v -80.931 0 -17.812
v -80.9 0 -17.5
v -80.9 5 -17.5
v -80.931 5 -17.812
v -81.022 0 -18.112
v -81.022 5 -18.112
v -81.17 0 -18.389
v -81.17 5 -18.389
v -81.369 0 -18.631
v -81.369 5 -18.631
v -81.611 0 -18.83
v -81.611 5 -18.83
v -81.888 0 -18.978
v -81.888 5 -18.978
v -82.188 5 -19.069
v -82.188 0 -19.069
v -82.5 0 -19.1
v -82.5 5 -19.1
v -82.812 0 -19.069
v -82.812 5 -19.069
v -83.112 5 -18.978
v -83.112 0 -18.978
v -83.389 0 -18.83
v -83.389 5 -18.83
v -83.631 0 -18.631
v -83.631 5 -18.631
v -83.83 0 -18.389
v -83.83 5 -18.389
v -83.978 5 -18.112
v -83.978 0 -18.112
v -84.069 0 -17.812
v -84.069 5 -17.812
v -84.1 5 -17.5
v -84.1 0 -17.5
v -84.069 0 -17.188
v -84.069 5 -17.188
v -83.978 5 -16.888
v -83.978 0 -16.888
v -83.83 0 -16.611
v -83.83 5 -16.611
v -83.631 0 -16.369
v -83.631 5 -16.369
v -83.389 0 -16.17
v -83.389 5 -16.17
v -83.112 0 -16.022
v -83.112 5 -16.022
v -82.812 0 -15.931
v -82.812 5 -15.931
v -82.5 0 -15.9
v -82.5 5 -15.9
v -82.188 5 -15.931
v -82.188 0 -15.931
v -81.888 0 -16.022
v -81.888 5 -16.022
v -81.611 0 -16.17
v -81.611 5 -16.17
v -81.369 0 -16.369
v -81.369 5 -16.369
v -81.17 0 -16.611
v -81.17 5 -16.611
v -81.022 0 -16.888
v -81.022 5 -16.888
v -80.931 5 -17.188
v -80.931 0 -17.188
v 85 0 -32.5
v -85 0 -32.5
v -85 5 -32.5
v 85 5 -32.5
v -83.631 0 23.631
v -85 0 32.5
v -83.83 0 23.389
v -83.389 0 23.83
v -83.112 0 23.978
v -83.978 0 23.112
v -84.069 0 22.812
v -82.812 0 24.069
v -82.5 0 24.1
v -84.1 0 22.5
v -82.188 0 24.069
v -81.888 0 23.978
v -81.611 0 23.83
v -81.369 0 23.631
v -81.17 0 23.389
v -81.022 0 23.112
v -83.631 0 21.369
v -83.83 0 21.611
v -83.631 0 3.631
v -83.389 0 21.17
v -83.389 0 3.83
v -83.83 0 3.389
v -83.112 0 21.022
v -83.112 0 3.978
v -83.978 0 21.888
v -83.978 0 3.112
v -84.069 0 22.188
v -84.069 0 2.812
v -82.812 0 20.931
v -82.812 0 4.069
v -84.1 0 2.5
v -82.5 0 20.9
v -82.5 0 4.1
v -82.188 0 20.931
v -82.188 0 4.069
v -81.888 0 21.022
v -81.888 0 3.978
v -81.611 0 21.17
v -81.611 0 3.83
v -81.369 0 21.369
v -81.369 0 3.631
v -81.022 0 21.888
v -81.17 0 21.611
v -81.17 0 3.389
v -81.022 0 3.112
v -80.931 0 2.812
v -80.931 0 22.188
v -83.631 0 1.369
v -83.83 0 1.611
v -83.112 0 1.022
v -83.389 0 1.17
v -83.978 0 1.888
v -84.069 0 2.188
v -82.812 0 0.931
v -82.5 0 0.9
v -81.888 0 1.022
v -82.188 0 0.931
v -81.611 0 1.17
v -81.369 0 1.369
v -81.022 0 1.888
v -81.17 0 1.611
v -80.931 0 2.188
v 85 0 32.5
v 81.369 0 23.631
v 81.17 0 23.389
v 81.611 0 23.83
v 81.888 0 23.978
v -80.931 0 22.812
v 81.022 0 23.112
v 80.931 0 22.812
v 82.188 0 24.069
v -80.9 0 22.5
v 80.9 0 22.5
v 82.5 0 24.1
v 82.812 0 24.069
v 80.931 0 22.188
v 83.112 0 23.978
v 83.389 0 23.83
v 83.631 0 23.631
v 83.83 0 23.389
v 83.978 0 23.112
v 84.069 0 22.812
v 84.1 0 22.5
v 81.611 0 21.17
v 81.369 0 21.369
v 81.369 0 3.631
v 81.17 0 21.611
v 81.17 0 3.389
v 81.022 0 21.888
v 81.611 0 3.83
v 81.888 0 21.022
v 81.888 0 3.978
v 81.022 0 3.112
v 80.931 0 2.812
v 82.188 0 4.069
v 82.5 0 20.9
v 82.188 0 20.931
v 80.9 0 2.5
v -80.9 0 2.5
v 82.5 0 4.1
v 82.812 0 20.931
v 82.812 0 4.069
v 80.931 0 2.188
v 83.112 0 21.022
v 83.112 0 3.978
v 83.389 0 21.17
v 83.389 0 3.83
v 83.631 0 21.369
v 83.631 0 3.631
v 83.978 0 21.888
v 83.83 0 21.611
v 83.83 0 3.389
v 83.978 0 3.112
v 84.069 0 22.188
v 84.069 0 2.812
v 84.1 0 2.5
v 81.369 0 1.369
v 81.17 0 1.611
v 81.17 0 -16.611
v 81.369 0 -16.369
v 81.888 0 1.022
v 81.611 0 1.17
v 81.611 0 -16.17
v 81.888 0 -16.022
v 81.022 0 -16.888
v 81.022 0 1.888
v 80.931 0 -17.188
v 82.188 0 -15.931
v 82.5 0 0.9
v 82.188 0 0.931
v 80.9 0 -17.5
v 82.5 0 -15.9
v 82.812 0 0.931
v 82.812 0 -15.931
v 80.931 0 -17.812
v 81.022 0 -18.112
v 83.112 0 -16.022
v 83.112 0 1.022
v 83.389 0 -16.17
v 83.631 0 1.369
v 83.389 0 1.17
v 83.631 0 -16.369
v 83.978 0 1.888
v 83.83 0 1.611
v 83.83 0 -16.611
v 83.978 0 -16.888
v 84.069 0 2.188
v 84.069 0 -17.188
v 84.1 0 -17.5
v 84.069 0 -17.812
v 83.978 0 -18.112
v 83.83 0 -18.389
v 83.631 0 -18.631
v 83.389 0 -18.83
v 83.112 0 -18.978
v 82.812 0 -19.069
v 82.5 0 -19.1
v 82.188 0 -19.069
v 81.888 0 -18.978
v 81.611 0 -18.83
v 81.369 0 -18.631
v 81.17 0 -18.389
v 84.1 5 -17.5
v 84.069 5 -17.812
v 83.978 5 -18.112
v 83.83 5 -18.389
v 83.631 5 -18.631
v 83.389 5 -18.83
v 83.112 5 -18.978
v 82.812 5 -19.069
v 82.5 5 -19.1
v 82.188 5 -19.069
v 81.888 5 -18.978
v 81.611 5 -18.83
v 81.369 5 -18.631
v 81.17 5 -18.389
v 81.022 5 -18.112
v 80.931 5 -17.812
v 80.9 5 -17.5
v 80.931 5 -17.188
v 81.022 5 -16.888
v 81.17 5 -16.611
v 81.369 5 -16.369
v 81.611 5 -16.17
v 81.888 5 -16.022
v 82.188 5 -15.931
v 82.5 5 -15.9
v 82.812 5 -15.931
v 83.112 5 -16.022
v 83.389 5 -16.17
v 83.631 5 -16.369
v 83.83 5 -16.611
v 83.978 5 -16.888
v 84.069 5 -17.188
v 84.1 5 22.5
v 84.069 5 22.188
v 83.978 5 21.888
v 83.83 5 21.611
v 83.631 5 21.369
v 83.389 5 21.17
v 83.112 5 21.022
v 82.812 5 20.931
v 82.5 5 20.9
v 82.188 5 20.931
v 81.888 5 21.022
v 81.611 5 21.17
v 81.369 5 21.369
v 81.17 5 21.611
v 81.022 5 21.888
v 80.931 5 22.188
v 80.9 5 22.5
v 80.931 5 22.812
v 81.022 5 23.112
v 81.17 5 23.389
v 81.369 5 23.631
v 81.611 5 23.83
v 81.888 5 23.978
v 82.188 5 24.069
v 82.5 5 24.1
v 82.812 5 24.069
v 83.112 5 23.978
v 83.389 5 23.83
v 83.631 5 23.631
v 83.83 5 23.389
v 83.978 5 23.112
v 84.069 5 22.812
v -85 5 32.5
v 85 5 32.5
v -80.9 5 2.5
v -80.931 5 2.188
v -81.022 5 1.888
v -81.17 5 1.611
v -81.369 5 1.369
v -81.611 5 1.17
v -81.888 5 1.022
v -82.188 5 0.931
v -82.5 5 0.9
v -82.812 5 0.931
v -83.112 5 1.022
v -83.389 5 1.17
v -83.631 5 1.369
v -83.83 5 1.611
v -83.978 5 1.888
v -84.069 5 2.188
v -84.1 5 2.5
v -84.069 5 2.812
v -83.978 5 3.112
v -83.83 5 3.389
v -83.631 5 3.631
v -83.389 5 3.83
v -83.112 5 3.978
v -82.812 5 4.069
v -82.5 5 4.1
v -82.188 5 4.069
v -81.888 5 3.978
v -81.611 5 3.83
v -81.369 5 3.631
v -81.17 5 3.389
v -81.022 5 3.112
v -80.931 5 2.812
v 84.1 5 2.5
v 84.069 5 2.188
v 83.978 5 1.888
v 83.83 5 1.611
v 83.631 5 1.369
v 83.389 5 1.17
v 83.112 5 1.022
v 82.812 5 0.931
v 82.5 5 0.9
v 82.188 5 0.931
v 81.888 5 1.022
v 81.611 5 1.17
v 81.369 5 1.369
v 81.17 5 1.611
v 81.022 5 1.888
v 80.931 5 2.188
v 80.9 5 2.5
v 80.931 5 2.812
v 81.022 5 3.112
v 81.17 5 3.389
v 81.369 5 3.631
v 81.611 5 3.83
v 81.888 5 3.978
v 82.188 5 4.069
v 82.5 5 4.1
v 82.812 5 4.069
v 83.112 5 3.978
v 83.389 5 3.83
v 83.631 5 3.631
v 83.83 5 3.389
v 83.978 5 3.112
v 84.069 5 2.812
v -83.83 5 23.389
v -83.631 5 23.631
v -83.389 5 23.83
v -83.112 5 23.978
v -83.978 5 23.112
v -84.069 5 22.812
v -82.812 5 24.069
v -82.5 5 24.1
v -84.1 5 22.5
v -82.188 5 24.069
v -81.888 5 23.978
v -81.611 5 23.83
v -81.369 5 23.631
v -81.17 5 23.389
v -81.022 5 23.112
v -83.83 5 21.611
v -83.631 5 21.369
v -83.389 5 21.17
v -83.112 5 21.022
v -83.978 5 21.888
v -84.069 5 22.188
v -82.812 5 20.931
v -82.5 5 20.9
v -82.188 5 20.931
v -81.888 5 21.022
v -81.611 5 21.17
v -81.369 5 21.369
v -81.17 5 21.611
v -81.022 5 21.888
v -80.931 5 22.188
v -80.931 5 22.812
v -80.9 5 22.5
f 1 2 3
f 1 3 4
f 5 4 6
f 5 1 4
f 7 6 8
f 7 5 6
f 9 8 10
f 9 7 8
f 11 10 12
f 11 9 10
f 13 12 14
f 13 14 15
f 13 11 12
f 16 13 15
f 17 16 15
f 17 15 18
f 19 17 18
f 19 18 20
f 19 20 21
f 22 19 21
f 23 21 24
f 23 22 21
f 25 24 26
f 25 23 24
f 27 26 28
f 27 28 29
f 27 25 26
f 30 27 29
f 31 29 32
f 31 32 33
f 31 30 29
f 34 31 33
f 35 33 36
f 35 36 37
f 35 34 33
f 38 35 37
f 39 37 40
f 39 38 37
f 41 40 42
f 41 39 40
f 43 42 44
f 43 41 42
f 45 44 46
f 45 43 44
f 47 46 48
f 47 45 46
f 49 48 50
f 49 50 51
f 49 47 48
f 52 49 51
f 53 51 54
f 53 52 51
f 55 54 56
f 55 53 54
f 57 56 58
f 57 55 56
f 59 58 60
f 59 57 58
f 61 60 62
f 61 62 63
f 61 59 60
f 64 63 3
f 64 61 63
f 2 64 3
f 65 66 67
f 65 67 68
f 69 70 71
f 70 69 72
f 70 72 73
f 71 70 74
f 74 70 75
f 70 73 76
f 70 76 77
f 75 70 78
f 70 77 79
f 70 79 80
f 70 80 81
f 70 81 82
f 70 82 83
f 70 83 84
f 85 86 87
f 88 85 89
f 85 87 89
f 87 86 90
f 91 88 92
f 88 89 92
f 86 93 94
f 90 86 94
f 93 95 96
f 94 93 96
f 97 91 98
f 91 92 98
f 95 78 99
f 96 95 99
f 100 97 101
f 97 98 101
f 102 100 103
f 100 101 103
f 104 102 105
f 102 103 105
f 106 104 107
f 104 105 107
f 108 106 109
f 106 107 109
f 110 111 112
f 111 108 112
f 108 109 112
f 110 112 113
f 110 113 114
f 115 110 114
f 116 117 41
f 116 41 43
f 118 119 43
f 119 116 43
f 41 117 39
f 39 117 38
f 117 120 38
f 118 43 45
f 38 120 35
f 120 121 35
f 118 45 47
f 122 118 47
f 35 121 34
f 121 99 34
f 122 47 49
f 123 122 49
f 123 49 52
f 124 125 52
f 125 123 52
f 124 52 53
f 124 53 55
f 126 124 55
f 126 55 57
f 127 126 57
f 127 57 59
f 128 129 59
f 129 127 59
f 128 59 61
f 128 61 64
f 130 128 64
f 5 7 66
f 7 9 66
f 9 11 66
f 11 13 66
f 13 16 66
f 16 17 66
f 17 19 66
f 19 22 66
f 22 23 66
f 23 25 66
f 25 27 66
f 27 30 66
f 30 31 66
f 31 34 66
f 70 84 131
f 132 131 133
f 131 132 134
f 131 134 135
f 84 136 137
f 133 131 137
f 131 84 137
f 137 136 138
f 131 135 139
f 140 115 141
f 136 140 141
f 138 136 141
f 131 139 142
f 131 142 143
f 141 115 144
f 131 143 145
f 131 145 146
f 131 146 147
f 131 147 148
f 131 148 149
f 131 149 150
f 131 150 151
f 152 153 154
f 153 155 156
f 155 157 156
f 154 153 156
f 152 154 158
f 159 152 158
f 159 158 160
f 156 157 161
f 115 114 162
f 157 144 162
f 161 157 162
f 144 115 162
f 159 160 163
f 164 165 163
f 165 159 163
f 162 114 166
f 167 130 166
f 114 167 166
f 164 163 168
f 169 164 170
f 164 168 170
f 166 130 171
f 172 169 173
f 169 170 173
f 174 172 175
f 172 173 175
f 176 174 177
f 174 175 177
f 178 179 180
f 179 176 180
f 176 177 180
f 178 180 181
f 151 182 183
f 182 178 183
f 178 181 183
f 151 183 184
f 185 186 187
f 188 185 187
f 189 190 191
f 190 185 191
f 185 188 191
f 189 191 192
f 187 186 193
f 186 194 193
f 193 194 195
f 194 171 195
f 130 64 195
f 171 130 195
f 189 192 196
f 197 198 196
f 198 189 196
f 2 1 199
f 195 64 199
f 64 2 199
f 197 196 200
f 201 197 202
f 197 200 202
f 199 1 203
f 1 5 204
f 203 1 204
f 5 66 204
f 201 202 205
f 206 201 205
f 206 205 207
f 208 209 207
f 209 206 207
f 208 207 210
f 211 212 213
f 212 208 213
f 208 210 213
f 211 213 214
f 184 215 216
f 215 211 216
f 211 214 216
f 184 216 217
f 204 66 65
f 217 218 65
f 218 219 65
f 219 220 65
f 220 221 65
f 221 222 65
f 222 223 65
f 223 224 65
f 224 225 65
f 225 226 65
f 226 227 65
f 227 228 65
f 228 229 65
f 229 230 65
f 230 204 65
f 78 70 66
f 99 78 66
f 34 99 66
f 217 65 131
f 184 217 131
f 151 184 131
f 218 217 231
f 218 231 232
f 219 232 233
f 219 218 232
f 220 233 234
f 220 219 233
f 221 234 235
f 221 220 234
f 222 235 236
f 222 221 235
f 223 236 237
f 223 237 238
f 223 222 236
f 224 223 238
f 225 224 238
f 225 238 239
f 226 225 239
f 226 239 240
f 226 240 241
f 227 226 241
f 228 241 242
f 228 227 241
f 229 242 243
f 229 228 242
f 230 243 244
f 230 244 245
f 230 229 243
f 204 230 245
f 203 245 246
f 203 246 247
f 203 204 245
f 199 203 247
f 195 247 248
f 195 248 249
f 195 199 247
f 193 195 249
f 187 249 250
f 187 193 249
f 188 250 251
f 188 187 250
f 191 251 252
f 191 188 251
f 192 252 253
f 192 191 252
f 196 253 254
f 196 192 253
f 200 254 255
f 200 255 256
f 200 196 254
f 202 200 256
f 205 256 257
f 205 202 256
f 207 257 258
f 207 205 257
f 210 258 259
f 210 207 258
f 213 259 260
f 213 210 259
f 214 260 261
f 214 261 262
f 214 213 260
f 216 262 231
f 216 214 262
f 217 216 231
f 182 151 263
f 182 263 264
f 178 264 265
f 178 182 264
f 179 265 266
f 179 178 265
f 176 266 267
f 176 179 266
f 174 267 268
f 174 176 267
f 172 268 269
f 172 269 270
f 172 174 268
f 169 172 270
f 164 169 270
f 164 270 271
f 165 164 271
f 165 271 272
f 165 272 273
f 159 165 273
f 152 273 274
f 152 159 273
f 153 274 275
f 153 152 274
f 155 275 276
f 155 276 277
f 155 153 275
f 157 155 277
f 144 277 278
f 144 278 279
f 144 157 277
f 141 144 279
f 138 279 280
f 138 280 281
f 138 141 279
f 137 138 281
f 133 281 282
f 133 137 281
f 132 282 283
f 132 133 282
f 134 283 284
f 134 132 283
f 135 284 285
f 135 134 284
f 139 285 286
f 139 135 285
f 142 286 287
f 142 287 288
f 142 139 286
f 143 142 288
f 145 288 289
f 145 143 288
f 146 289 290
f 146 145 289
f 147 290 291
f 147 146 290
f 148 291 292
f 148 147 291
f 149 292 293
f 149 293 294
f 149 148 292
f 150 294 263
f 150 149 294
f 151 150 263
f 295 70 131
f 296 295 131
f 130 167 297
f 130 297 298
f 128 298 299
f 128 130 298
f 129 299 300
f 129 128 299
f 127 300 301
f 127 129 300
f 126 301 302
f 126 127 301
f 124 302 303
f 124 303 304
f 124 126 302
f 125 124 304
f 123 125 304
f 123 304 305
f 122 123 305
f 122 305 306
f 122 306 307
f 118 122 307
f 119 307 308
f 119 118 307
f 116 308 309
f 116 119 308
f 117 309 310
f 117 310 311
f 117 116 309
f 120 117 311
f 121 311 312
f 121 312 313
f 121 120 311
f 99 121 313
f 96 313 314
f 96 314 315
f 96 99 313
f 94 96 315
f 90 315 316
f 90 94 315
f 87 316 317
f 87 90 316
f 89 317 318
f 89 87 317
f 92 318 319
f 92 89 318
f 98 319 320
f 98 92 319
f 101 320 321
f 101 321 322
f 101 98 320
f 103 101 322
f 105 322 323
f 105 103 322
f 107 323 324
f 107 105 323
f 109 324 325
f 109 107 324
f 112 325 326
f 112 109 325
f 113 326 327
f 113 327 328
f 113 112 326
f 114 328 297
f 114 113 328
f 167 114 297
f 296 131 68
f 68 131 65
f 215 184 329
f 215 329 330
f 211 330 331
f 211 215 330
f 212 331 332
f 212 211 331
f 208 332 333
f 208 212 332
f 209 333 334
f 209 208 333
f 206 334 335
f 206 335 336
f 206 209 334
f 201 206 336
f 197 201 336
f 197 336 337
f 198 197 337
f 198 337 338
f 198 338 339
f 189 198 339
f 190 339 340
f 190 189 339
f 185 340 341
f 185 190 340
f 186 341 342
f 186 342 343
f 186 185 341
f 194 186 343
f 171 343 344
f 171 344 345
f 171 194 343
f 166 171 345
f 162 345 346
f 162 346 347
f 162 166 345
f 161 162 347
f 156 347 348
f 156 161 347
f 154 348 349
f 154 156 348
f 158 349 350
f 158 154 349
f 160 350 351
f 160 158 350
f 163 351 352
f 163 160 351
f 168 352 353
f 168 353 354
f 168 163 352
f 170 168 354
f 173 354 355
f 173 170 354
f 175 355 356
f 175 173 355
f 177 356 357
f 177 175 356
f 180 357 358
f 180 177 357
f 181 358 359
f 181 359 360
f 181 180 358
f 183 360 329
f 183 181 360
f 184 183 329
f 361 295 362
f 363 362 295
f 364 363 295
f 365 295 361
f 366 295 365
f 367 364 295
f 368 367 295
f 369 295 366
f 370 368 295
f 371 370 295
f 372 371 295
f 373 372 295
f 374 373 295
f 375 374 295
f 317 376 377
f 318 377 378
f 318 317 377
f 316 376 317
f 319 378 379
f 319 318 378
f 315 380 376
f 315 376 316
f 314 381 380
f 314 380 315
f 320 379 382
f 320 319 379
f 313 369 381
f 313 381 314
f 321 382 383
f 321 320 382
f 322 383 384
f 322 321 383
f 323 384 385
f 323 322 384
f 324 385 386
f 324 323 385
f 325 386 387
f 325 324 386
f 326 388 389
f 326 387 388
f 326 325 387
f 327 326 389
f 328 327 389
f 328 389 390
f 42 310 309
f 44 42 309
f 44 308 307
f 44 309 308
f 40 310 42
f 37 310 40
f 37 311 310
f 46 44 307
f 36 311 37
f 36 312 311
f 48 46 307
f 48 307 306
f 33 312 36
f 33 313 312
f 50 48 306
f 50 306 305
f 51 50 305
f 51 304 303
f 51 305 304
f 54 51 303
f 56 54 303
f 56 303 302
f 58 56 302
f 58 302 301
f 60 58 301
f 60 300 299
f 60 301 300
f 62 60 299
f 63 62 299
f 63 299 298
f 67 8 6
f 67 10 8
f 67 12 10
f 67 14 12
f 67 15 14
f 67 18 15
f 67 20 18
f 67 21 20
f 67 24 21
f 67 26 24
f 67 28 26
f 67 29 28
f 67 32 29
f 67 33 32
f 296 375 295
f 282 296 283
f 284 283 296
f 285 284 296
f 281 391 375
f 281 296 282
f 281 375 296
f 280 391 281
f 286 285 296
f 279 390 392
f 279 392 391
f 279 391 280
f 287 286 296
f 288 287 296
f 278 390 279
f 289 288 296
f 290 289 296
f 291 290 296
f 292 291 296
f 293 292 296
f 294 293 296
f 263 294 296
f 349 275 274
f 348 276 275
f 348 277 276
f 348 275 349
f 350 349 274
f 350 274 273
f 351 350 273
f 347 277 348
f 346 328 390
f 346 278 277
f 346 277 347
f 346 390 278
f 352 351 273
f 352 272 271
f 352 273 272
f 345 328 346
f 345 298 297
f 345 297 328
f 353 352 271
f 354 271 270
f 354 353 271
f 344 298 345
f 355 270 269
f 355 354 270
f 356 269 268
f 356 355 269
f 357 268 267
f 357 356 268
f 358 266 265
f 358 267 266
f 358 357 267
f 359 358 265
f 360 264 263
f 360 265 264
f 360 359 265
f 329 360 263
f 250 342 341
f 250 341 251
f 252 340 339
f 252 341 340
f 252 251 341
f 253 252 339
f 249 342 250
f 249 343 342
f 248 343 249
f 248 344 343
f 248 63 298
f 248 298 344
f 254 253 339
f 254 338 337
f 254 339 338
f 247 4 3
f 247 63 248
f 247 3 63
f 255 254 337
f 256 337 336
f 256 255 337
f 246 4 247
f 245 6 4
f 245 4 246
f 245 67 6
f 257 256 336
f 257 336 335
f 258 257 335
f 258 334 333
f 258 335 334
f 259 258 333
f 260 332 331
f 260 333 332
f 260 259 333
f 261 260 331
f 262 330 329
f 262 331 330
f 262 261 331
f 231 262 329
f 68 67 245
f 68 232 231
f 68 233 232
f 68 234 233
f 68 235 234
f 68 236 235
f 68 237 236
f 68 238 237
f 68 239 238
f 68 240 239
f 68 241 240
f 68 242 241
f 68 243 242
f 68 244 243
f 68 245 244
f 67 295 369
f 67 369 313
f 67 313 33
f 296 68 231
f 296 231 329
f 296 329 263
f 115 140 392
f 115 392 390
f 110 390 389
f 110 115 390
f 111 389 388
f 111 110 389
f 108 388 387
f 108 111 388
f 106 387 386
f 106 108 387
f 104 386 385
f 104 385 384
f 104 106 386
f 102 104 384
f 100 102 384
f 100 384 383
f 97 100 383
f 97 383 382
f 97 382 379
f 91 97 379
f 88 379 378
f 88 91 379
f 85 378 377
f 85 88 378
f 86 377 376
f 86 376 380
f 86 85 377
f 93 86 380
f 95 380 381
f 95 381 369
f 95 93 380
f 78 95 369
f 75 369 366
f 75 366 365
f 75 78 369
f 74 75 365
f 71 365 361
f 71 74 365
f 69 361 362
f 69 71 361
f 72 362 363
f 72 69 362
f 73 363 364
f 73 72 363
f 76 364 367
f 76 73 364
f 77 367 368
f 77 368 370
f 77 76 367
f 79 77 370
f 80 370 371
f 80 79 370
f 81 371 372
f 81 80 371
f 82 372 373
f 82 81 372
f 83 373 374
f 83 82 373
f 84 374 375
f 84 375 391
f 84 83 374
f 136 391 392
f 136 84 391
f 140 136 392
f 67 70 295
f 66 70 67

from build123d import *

# Parameters (mm, degrees)
SKETCH1_W           = 170
SKETCH1_H           = 65
SKETCH1_R           = 1.6
BOSS_EXTRUDE1_DEPTH = 5


with BuildPart() as part:
    # Sketch1 → Boss-Extrude1 (new body)
    with BuildSketch(Plane(origin=(0, 0, 0), x_dir=(1, 0, 0), z_dir=(0, 1, 0))):
        Rectangle(SKETCH1_W, SKETCH1_H)
        with Locations((-82.5, 17.5)):
            Circle(SKETCH1_R, mode=Mode.SUBTRACT)
        with Locations((-82.5, -2.5)):
            Circle(SKETCH1_R, mode=Mode.SUBTRACT)
        with Locations((-82.5, -22.5)):
            Circle(SKETCH1_R, mode=Mode.SUBTRACT)
        with Locations((82.5, -22.5)):
            Circle(SKETCH1_R, mode=Mode.SUBTRACT)
        with Locations((82.5, -2.5)):
            Circle(SKETCH1_R, mode=Mode.SUBTRACT)
        with Locations((82.5, 17.5)):
            Circle(SKETCH1_R, mode=Mode.SUBTRACT)
    extrude(amount=BOSS_EXTRUDE1_DEPTH)


solid = part.part
